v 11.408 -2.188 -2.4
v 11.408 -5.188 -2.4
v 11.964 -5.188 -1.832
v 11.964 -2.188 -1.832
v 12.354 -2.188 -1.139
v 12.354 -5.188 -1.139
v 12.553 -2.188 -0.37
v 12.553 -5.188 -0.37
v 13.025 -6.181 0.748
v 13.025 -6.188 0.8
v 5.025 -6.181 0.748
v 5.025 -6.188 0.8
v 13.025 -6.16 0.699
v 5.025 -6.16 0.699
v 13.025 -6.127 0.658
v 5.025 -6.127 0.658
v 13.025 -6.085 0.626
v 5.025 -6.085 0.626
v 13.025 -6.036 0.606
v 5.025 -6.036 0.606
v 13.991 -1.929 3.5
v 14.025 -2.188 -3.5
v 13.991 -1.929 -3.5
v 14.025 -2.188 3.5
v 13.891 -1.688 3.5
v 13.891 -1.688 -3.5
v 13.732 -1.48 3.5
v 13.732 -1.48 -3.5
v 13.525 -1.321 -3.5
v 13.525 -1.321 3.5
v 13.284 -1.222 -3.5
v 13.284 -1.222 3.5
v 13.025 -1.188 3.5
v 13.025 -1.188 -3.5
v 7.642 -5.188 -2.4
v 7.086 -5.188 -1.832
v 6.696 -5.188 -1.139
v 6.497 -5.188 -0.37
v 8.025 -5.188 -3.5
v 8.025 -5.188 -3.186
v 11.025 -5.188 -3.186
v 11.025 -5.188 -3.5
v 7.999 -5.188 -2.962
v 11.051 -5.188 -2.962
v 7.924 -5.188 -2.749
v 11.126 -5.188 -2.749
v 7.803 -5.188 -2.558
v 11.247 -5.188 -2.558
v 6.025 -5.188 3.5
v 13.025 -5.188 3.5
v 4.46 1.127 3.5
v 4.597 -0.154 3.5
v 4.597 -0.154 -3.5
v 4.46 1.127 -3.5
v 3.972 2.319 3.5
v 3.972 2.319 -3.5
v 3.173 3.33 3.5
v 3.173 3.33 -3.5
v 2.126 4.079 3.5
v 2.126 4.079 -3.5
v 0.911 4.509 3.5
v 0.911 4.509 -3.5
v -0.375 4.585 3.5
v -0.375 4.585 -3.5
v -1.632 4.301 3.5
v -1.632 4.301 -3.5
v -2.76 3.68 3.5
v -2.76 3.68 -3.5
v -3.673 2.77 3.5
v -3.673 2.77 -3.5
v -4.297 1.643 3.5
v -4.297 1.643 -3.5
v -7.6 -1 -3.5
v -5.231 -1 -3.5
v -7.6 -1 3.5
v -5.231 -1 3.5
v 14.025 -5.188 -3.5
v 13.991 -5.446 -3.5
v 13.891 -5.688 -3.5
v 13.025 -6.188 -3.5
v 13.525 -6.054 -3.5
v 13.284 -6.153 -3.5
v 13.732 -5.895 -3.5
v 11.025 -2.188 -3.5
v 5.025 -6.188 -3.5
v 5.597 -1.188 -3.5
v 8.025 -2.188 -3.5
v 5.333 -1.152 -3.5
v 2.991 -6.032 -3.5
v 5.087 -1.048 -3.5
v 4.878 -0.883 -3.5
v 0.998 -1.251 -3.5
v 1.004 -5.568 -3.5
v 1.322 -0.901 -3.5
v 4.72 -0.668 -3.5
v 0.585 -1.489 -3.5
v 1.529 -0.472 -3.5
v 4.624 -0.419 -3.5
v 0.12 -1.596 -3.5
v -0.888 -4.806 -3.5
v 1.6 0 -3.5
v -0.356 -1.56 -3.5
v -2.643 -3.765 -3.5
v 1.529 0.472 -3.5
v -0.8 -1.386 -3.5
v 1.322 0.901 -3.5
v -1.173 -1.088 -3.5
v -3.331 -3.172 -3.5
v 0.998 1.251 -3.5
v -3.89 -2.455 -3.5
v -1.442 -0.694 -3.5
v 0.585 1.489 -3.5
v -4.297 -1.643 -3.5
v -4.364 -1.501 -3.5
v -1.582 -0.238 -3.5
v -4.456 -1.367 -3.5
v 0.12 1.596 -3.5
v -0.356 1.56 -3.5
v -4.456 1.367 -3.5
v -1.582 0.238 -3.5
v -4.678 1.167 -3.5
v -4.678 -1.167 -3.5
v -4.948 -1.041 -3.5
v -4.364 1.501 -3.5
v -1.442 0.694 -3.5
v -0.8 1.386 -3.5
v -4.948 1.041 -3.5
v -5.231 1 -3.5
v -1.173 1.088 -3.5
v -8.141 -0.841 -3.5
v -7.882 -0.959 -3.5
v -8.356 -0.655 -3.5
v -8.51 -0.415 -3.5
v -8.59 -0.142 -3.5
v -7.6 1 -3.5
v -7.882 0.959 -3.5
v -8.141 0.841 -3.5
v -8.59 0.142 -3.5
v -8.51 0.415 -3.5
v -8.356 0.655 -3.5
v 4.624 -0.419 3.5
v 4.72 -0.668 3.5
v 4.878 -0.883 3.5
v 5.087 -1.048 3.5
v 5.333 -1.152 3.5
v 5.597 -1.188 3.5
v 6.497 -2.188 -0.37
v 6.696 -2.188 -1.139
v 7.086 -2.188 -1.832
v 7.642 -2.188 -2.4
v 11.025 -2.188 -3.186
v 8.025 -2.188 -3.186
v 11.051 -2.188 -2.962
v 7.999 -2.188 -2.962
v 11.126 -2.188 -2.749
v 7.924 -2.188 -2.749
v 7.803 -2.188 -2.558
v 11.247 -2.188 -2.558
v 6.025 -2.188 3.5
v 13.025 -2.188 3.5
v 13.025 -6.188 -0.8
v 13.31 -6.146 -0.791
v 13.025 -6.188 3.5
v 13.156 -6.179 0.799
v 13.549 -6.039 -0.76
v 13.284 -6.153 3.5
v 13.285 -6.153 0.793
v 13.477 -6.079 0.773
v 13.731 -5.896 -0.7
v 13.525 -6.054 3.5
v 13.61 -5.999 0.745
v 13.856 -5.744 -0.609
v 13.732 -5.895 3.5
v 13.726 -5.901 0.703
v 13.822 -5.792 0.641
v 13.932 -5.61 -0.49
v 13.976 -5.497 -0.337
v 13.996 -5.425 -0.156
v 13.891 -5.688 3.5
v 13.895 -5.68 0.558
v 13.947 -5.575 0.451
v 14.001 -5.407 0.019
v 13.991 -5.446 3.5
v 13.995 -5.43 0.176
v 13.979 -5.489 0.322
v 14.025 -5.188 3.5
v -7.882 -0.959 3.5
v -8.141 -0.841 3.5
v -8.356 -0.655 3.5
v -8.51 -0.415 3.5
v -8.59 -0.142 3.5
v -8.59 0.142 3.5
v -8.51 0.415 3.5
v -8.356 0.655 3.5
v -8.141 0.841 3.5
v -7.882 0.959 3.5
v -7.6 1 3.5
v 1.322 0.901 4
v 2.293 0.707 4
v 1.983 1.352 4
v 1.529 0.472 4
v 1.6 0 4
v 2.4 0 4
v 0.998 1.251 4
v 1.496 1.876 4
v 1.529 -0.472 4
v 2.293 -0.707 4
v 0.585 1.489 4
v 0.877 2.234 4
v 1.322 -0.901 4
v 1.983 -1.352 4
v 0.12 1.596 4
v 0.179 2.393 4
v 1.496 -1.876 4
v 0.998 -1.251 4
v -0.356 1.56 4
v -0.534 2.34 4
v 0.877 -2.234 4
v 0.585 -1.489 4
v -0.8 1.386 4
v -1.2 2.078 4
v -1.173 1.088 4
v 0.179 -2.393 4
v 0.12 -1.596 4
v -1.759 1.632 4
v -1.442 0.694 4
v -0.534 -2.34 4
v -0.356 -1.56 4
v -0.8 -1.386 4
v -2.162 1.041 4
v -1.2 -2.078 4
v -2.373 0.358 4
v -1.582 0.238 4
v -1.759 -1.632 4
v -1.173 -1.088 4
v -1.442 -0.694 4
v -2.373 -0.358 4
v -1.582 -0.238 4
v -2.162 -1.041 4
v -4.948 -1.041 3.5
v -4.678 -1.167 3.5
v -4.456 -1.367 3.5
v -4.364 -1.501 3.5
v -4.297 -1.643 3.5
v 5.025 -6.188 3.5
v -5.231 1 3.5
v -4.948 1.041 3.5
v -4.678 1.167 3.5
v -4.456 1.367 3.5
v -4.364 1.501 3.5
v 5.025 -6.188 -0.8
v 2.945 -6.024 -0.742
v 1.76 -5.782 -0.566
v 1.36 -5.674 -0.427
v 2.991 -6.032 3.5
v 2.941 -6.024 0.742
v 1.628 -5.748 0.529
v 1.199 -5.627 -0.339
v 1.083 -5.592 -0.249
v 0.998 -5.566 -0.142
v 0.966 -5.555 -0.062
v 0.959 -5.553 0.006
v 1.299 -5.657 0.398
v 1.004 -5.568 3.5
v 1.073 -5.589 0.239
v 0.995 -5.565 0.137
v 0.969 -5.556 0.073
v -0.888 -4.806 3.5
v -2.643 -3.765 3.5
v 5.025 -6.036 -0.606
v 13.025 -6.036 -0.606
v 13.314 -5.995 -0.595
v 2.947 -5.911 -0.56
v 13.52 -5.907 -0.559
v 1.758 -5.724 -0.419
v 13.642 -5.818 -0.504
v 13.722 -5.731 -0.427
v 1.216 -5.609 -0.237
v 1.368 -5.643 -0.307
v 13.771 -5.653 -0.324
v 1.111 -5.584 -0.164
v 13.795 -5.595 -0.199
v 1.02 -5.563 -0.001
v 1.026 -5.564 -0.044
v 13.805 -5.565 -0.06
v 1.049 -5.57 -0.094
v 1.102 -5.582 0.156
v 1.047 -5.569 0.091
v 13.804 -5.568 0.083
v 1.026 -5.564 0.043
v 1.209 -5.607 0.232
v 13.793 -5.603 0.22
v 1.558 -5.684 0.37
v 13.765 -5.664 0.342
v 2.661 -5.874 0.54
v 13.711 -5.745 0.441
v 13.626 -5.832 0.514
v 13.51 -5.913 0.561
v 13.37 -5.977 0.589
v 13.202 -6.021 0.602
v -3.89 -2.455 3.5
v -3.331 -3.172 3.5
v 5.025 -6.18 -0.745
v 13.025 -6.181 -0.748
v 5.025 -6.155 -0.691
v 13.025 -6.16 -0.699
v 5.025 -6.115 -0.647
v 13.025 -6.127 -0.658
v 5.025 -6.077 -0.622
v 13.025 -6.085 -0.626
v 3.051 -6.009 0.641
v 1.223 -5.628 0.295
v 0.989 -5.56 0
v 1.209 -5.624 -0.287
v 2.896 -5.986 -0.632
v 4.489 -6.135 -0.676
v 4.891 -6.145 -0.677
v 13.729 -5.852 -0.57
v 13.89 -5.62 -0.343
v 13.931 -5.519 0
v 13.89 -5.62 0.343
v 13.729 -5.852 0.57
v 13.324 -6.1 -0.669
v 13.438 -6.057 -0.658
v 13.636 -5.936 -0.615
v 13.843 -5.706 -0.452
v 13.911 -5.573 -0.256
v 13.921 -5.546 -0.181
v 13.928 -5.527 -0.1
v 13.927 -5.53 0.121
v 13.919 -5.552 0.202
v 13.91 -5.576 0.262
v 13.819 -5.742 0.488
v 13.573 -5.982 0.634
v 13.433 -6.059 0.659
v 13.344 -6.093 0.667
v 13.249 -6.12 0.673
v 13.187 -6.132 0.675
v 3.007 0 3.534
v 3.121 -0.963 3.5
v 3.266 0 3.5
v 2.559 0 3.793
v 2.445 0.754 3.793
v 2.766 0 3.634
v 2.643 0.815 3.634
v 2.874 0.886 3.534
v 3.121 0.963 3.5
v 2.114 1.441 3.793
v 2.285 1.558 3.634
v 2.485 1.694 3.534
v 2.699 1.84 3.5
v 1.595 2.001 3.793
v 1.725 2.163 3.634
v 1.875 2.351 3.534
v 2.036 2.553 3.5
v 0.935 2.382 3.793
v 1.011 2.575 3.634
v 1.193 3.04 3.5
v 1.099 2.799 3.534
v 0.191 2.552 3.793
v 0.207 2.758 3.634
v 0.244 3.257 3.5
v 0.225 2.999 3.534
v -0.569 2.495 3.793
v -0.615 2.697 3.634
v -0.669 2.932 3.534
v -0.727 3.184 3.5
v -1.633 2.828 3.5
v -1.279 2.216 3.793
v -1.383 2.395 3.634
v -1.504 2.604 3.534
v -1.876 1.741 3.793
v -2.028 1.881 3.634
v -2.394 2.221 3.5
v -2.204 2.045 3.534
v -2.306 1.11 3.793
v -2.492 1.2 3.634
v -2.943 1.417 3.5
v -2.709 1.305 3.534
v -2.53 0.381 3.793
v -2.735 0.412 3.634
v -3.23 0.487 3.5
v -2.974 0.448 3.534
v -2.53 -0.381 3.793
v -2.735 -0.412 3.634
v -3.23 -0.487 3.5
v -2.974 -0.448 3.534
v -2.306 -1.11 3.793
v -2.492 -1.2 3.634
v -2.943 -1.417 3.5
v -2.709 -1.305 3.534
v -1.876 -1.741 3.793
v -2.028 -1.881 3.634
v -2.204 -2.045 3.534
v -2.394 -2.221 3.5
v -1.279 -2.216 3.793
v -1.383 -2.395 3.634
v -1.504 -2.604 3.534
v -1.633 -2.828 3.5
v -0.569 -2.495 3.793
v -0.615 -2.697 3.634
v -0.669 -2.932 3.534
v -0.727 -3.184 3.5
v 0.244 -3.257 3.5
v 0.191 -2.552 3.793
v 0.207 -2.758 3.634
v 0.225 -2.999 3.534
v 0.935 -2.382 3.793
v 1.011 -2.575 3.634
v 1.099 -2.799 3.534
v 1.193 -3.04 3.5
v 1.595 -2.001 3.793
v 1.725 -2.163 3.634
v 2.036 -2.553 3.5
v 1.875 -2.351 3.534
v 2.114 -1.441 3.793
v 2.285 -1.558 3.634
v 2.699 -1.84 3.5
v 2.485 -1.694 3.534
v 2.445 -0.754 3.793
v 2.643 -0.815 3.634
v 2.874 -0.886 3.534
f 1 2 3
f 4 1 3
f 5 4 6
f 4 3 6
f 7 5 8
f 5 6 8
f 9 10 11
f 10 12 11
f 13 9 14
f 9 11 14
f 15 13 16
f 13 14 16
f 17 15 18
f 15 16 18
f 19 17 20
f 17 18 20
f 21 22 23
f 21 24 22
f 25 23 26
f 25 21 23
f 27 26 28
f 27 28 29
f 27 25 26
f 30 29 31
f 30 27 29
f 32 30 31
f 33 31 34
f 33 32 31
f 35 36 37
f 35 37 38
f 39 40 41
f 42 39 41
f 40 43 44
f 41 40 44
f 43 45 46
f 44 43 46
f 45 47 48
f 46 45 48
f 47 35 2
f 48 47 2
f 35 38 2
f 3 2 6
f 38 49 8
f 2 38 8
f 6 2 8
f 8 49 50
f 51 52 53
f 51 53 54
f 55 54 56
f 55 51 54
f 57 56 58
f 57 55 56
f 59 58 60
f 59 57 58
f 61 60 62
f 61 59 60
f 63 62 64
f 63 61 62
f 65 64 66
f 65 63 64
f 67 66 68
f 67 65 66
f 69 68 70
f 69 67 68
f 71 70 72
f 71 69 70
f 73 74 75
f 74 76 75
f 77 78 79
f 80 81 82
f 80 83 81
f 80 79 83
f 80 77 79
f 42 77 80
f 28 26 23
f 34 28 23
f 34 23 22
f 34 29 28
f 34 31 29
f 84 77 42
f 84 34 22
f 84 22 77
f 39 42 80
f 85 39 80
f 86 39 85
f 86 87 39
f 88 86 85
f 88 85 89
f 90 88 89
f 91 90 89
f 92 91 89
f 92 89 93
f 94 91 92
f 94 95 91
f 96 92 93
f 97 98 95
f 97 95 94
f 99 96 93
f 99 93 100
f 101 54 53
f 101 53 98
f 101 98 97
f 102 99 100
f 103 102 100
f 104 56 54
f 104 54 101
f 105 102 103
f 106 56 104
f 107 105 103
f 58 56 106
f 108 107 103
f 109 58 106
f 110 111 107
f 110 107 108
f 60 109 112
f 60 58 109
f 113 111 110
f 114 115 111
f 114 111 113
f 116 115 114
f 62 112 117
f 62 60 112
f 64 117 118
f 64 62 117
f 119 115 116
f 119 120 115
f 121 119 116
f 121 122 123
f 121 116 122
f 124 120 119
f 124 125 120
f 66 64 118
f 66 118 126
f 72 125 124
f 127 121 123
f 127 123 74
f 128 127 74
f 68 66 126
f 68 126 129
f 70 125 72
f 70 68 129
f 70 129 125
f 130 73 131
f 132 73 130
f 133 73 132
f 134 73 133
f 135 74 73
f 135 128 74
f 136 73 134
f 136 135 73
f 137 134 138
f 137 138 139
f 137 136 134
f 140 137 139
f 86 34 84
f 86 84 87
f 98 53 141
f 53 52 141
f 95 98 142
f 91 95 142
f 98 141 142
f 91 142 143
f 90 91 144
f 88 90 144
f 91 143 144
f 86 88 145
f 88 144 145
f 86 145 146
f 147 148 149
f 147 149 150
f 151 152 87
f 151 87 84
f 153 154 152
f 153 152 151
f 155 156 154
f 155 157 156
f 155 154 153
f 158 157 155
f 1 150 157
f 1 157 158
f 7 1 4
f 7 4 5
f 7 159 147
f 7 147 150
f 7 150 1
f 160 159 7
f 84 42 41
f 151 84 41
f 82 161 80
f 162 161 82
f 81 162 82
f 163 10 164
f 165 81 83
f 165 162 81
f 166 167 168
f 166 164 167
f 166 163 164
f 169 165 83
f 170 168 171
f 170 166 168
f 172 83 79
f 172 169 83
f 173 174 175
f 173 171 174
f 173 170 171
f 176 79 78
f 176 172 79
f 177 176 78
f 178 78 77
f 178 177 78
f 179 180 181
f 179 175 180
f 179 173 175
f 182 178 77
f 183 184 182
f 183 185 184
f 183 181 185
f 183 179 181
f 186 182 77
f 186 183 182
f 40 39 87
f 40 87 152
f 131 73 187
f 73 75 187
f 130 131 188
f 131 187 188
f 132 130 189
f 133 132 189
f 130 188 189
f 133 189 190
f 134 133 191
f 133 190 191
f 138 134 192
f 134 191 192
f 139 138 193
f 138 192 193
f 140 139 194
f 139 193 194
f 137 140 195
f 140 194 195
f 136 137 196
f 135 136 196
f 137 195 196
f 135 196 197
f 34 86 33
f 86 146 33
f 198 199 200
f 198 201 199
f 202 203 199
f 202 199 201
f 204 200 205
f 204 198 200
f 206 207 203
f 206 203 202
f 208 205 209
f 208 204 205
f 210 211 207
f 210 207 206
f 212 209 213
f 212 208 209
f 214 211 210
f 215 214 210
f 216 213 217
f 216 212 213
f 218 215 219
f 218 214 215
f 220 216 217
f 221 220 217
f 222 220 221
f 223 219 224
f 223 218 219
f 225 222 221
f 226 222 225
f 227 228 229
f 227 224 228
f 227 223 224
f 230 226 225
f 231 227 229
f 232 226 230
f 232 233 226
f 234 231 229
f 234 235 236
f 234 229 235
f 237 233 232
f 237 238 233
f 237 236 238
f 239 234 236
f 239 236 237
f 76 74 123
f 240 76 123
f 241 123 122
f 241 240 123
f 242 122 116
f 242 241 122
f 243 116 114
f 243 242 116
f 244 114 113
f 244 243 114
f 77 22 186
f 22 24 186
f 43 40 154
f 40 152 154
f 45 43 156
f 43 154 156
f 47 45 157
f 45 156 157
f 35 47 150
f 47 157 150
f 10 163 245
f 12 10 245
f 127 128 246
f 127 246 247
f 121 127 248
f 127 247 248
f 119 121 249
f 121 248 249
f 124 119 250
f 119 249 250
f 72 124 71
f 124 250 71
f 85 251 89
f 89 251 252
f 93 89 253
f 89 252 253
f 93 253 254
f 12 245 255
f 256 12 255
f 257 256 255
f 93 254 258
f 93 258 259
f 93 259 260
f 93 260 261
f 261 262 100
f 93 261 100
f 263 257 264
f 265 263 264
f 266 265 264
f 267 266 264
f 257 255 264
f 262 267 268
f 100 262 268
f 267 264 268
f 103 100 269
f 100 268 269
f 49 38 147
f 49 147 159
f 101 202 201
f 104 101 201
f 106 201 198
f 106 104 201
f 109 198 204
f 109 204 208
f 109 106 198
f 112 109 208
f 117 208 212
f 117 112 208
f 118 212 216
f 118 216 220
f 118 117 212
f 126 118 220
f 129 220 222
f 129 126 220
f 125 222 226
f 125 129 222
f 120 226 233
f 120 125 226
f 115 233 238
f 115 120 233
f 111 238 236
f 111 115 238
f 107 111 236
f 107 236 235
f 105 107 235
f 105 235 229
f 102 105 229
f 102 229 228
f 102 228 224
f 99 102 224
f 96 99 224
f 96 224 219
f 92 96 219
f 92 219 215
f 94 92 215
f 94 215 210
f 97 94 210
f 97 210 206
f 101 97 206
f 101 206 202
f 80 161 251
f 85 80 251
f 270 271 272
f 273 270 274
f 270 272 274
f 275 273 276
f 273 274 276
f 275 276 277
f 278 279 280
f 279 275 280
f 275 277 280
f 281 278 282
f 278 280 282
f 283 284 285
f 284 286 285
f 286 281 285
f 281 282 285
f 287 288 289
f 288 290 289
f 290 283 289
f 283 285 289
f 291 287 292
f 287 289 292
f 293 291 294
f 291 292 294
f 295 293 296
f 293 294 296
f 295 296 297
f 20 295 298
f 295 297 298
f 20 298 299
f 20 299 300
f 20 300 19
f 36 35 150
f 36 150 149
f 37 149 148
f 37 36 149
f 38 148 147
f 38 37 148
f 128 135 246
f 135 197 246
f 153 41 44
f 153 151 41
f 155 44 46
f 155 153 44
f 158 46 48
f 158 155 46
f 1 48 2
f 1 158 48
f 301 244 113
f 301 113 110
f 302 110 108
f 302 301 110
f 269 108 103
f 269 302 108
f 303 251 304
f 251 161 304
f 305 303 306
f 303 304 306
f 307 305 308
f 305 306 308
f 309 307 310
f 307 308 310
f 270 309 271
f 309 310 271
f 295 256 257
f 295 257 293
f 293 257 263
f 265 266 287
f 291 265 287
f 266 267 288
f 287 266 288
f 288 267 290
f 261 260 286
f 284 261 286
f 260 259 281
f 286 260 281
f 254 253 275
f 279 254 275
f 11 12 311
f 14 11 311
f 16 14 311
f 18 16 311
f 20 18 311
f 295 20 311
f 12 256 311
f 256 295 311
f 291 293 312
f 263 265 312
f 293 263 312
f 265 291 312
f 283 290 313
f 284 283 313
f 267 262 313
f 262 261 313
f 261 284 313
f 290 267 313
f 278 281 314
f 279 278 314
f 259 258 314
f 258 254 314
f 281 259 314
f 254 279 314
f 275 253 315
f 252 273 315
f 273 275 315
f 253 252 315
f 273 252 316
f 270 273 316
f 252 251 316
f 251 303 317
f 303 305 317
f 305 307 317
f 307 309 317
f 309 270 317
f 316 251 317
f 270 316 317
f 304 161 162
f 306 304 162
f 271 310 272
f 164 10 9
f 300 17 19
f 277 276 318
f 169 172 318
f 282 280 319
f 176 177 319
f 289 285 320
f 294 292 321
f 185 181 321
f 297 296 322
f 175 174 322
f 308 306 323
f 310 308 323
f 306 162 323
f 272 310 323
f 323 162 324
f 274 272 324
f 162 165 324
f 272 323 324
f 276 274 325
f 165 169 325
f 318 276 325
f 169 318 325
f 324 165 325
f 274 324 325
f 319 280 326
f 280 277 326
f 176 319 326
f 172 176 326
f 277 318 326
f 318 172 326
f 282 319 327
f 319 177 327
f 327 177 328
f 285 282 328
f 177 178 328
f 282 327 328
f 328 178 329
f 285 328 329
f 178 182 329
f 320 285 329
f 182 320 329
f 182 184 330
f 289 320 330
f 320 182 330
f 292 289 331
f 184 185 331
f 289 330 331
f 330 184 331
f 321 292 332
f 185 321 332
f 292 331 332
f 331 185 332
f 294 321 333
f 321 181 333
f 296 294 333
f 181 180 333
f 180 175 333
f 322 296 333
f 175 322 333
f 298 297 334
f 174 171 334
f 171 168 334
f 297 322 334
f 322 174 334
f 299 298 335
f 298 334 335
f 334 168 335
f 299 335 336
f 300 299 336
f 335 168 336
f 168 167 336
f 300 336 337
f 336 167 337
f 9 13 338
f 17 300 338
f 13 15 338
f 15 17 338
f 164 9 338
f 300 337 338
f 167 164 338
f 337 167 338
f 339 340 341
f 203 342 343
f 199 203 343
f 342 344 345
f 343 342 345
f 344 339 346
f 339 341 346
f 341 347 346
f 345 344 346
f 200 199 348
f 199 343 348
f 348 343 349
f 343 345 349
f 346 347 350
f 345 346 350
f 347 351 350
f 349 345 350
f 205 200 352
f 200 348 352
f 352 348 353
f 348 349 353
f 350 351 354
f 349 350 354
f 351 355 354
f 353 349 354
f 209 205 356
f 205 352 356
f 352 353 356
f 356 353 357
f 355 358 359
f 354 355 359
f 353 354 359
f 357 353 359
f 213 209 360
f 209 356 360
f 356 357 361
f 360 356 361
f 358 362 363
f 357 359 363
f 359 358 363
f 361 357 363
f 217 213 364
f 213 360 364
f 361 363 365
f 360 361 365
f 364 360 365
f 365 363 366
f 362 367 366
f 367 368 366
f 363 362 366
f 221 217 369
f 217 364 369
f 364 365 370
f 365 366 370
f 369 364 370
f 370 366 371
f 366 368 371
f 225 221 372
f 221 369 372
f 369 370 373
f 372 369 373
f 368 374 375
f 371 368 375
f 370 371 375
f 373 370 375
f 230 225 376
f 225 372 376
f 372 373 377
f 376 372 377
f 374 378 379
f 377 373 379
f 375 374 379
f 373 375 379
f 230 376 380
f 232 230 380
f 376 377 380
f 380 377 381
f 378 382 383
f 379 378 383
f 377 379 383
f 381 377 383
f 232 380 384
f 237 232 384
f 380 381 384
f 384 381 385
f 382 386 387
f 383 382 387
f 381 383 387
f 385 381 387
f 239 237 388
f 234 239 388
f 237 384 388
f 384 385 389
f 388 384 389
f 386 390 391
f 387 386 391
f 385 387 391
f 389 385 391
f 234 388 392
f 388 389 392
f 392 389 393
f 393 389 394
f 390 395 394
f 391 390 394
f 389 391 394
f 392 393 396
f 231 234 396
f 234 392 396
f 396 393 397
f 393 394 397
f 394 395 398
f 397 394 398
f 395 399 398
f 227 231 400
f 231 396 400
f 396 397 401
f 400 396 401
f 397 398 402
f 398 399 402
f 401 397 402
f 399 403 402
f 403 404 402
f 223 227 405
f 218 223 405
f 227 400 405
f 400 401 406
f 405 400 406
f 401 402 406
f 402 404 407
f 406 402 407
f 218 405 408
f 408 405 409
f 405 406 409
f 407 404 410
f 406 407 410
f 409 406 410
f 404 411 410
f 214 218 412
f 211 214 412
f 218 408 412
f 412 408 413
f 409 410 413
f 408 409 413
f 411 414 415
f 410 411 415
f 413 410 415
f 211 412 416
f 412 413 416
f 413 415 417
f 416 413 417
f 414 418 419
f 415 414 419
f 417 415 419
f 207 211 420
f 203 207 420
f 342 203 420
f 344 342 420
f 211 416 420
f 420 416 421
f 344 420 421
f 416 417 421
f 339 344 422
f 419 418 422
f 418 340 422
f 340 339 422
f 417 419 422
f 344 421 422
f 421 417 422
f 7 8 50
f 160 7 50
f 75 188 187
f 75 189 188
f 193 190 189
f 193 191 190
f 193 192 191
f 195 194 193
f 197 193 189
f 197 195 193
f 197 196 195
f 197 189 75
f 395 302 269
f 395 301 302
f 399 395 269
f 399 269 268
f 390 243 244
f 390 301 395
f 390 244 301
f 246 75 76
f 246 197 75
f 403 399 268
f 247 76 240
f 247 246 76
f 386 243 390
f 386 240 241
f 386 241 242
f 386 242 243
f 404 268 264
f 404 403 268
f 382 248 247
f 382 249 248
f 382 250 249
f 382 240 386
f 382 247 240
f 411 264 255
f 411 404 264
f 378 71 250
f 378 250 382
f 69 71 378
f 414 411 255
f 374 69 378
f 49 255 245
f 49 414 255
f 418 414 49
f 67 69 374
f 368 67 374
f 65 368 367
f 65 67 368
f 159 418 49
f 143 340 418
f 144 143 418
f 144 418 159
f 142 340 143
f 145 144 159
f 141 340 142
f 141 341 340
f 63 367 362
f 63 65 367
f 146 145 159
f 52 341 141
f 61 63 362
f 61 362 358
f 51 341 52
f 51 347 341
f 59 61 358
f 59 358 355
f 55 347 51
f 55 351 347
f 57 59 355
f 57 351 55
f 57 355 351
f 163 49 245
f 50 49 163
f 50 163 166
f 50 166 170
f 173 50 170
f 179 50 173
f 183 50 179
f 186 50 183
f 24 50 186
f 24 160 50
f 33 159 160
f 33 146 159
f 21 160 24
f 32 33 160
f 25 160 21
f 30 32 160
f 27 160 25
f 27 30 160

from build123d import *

# Parameters (mm, degrees)
SKETCH1_R           = 4.6
SKETCH1_R_2         = 1.6
BOSS_EXTRUDE1_DEPTH = 3.499999985
SKETCH2_W           = 7
SKETCH2_H           = 3
BOSS_EXTRUDE2_DEPTH = 3.499999985
BOSS_EXTRUDE3_REACH = 19.457
FILLET5_R           = 1
SKETCH6_R           = 0.625
CUT_EXTRUDE1_DEPTH  = 20.935540653
FILLET1_R           = 0.2
BOSS_EXTRUDE4_DEPTH = 3.499999985
FILLET2_R           = 1
FILLET3_R           = 1
BOSS_EXTRUDE5_START = 3.5
SKETCH1_2_R         = 4.6
SKETCH1_2_R_2       = 1.6
BOSS_EXTRUDE5_DEPTH = 0.5
SKETCH9_OUTSIDE_W   = 29.857
SKETCH9_OUTSIDE_H   = 18.02
SKETCH9_OUTSIDE_R   = 2.4
CUT_EXTRUDE2_DEPTH  = 0.5
FILLET4_R           = 1


with BuildPart() as part:
    # Sketch1 → Boss-Extrude1 (new, symmetric)
    with BuildSketch(Plane.XY):
        Circle(SKETCH1_R)
        Circle(SKETCH1_R_2, mode=Mode.SUBTRACT)
    extrude(amount=BOSS_EXTRUDE1_DEPTH, both=True)

    # Sketch2 → Boss-Extrude2 (add, symmetric)
    with BuildSketch(Plane.XY):
        with BuildLine():
            Line((14.025, -6.1875), (5.025, -6.1875))
            ThreePointArc((5.025, -6.1875), (1.004374029, -5.567503073), (-2.642710133, -3.765113963))
            ThreePointArc((-2.642710133, -3.765113963), (2.053101866, -4.116402887), (4.597420853, -0.154017857))
            ThreePointArc((4.597420853, -0.154017857), (4.878013126, -0.882668274), (5.596860169, -1.1875))
            Line((5.596860169, -1.1875), (14.025, -1.1875))
            Line((14.025, -1.1875), (14.025, -6.1875))
        make_face()
        with Locations((9.525, -3.6875)):
            Rectangle(SKETCH2_W, SKETCH2_H, mode=Mode.SUBTRACT)
    extrude(amount=BOSS_EXTRUDE2_DEPTH, both=True)

    # Sketch3 → Boss-Extrude3 (add, up to next)
    with BuildSketch(Plane(origin=(0, -5.1875, 0), x_dir=(1, 0, 0), z_dir=(0, 1, 0)), mode=Mode.PRIVATE) as boss_extrude3_sk1:
        with BuildLine():
            Line((6.497484118, 0.369658741), (6.025, -3.499999985))
            Line((6.025, -3.499999985), (6.025, 3.499999985))
            Line((6.025, 3.499999985), (8.025, 3.499999985))
            Line((8.025, 3.499999985), (8.025, 2.655654345))
            ThreePointArc((8.025, 2.655654345), (6.989049687, 1.694537108), (6.497484118, 0.369658741))
        make_face()
    boss_extrude3_tool1 = extrude(boss_extrude3_sk1.sketch, amount=BOSS_EXTRUDE3_REACH, mode=Mode.PRIVATE) - part.part
    # Sketch3 → Boss-Extrude3 (add, up to next)
    with BuildSketch(Plane(origin=(0, -5.1875, 0), x_dir=(1, 0, 0), z_dir=(0, 1, 0)), mode=Mode.PRIVATE) as boss_extrude3_sk2:
        with BuildLine():
            Line((12.552515882, 0.369658741), (13.025, -3.499999985))
            Line((13.025, -3.499999985), (13.025, 3.499999985))
            Line((13.025, 3.499999985), (11.025, 3.499999985))
            Line((11.025, 3.499999985), (11.025, 2.655654345))
            ThreePointArc((11.025, 2.655654345), (12.060950313, 1.694537108), (12.552515882, 0.369658741))
        make_face()
    boss_extrude3_tool2 = extrude(boss_extrude3_sk2.sketch, amount=BOSS_EXTRUDE3_REACH, mode=Mode.PRIVATE) - part.part
    add(boss_extrude3_tool1.solids().sort_by_distance((6.671602, -5.1875, -1.728299))[0])
    add(boss_extrude3_tool2.solids().sort_by_distance((12.378398, -5.1875, -1.728299))[0])

    # Fillet5
    fillet5_edges = [part.edges().sort_by_distance(p)[0] for p in [
        (14.025, -6.1875, 0),
        (14.025, -1.1875, 0),
    ]]
    fillet(fillet5_edges, radius=FILLET5_R)

    # Sketch6 → Cut-Extrude1 (cut, through all)
    with BuildSketch(Plane(origin=(14.025, 0, 0), x_dir=(0, 0, -1), z_dir=(1, 0, 0))):
        with Locations((0, -6.1875)):
            Circle(SKETCH6_R)
    extrude(amount=-CUT_EXTRUDE1_DEPTH, mode=Mode.SUBTRACT)

    # Fillet1
    fillet1_edges = [part.edges().sort_by_distance(p)[0] for p in [
        (13.95202478, -5.562500075, 0.000306186),
        (9.025, -6.1875, -0.625),
        (0.988571933, -5.562500075, 0.000306187),
        (9.025, -6.1875, 0.625),
    ]]
    fillet(fillet1_edges, radius=FILLET1_R)

    # Sketch7 → Boss-Extrude4 (add, symmetric)
    with BuildSketch(Plane.XY):
        with BuildLine():
            Line((-4.6, -1), (-7.6, -1))
            ThreePointArc((-7.6, -1), (-8.6, 0), (-7.6, 1))
            Line((-7.6, 1), (-4.6, 1))
            ThreePointArc((-4.6, 1), (-3.6, 0), (-4.6, -1))
        make_face()
    extrude(amount=BOSS_EXTRUDE4_DEPTH, both=True)

    # Fillet2
    fillet2_edges = [part.edges().sort_by_distance(p)[0] for p in [
        (-4.491304348, 0.994075075, 0),
        (-4.491304348, -0.994075075, 0),
    ]]
    fillet(fillet2_edges, radius=FILLET2_R)

    # Fillet3
    fillet3_edges = [part.edges().sort_by_distance(p)[0] for p in [
        (11.025, -3.6875, -2.655654345),
        (8.025, -3.6875, -2.655654345),
    ]]
    fillet(fillet3_edges, radius=FILLET3_R)

    # Sketch1<2> → Boss-Extrude5 (add, symmetric)
    with BuildSketch(Plane.XY.offset(BOSS_EXTRUDE5_START)):
        with Locations(Location((0, 0, 0), (0, 0, 159.075167572))):
            Circle(SKETCH1_2_R)
        Circle(SKETCH1_2_R_2, mode=Mode.SUBTRACT)
    extrude(amount=BOSS_EXTRUDE5_DEPTH, both=True)

    # Sketch9 outside → Cut-Extrude2 (cut)
    with BuildSketch(Plane.XY.offset(3.999999985)):
        with Locations((2.7125, -0.794)):
            Rectangle(SKETCH9_OUTSIDE_W, SKETCH9_OUTSIDE_H)
        Circle(SKETCH9_OUTSIDE_R, mode=Mode.SUBTRACT)
    extrude(amount=-CUT_EXTRUDE2_DEPTH, mode=Mode.SUBTRACT)

    # Fillet4
    # the kernel refuses this fillet: 1 mm, written as the material it adds along each edge
    with BuildSketch(Plane(origin=(0, 0, 3.499999985), x_dir=(1, 0, 0), z_dir=(0, -1, 0))) as fillet4_piece_1:
        with BuildLine():
            CenterArc((3.266025404, 1), FILLET4_R, 210, 60)
            Line((2.4, 0.5), (2.382679492, 0.49))
            ThreePointArc((2.382679492, 0.49), (2.38, 0.25), (2.38, 0))
            Line((2.38, 0), (2.4, -0.02))
            Line((2.4, -0.02), (3.266025404, -0.02))
            Line((3.266025404, -0.02), (3.266025404, 0))
        make_face()
    revolve(axis=Axis((0, 0, 3.499999985), (0, 0, 1)))


solid = part.part
